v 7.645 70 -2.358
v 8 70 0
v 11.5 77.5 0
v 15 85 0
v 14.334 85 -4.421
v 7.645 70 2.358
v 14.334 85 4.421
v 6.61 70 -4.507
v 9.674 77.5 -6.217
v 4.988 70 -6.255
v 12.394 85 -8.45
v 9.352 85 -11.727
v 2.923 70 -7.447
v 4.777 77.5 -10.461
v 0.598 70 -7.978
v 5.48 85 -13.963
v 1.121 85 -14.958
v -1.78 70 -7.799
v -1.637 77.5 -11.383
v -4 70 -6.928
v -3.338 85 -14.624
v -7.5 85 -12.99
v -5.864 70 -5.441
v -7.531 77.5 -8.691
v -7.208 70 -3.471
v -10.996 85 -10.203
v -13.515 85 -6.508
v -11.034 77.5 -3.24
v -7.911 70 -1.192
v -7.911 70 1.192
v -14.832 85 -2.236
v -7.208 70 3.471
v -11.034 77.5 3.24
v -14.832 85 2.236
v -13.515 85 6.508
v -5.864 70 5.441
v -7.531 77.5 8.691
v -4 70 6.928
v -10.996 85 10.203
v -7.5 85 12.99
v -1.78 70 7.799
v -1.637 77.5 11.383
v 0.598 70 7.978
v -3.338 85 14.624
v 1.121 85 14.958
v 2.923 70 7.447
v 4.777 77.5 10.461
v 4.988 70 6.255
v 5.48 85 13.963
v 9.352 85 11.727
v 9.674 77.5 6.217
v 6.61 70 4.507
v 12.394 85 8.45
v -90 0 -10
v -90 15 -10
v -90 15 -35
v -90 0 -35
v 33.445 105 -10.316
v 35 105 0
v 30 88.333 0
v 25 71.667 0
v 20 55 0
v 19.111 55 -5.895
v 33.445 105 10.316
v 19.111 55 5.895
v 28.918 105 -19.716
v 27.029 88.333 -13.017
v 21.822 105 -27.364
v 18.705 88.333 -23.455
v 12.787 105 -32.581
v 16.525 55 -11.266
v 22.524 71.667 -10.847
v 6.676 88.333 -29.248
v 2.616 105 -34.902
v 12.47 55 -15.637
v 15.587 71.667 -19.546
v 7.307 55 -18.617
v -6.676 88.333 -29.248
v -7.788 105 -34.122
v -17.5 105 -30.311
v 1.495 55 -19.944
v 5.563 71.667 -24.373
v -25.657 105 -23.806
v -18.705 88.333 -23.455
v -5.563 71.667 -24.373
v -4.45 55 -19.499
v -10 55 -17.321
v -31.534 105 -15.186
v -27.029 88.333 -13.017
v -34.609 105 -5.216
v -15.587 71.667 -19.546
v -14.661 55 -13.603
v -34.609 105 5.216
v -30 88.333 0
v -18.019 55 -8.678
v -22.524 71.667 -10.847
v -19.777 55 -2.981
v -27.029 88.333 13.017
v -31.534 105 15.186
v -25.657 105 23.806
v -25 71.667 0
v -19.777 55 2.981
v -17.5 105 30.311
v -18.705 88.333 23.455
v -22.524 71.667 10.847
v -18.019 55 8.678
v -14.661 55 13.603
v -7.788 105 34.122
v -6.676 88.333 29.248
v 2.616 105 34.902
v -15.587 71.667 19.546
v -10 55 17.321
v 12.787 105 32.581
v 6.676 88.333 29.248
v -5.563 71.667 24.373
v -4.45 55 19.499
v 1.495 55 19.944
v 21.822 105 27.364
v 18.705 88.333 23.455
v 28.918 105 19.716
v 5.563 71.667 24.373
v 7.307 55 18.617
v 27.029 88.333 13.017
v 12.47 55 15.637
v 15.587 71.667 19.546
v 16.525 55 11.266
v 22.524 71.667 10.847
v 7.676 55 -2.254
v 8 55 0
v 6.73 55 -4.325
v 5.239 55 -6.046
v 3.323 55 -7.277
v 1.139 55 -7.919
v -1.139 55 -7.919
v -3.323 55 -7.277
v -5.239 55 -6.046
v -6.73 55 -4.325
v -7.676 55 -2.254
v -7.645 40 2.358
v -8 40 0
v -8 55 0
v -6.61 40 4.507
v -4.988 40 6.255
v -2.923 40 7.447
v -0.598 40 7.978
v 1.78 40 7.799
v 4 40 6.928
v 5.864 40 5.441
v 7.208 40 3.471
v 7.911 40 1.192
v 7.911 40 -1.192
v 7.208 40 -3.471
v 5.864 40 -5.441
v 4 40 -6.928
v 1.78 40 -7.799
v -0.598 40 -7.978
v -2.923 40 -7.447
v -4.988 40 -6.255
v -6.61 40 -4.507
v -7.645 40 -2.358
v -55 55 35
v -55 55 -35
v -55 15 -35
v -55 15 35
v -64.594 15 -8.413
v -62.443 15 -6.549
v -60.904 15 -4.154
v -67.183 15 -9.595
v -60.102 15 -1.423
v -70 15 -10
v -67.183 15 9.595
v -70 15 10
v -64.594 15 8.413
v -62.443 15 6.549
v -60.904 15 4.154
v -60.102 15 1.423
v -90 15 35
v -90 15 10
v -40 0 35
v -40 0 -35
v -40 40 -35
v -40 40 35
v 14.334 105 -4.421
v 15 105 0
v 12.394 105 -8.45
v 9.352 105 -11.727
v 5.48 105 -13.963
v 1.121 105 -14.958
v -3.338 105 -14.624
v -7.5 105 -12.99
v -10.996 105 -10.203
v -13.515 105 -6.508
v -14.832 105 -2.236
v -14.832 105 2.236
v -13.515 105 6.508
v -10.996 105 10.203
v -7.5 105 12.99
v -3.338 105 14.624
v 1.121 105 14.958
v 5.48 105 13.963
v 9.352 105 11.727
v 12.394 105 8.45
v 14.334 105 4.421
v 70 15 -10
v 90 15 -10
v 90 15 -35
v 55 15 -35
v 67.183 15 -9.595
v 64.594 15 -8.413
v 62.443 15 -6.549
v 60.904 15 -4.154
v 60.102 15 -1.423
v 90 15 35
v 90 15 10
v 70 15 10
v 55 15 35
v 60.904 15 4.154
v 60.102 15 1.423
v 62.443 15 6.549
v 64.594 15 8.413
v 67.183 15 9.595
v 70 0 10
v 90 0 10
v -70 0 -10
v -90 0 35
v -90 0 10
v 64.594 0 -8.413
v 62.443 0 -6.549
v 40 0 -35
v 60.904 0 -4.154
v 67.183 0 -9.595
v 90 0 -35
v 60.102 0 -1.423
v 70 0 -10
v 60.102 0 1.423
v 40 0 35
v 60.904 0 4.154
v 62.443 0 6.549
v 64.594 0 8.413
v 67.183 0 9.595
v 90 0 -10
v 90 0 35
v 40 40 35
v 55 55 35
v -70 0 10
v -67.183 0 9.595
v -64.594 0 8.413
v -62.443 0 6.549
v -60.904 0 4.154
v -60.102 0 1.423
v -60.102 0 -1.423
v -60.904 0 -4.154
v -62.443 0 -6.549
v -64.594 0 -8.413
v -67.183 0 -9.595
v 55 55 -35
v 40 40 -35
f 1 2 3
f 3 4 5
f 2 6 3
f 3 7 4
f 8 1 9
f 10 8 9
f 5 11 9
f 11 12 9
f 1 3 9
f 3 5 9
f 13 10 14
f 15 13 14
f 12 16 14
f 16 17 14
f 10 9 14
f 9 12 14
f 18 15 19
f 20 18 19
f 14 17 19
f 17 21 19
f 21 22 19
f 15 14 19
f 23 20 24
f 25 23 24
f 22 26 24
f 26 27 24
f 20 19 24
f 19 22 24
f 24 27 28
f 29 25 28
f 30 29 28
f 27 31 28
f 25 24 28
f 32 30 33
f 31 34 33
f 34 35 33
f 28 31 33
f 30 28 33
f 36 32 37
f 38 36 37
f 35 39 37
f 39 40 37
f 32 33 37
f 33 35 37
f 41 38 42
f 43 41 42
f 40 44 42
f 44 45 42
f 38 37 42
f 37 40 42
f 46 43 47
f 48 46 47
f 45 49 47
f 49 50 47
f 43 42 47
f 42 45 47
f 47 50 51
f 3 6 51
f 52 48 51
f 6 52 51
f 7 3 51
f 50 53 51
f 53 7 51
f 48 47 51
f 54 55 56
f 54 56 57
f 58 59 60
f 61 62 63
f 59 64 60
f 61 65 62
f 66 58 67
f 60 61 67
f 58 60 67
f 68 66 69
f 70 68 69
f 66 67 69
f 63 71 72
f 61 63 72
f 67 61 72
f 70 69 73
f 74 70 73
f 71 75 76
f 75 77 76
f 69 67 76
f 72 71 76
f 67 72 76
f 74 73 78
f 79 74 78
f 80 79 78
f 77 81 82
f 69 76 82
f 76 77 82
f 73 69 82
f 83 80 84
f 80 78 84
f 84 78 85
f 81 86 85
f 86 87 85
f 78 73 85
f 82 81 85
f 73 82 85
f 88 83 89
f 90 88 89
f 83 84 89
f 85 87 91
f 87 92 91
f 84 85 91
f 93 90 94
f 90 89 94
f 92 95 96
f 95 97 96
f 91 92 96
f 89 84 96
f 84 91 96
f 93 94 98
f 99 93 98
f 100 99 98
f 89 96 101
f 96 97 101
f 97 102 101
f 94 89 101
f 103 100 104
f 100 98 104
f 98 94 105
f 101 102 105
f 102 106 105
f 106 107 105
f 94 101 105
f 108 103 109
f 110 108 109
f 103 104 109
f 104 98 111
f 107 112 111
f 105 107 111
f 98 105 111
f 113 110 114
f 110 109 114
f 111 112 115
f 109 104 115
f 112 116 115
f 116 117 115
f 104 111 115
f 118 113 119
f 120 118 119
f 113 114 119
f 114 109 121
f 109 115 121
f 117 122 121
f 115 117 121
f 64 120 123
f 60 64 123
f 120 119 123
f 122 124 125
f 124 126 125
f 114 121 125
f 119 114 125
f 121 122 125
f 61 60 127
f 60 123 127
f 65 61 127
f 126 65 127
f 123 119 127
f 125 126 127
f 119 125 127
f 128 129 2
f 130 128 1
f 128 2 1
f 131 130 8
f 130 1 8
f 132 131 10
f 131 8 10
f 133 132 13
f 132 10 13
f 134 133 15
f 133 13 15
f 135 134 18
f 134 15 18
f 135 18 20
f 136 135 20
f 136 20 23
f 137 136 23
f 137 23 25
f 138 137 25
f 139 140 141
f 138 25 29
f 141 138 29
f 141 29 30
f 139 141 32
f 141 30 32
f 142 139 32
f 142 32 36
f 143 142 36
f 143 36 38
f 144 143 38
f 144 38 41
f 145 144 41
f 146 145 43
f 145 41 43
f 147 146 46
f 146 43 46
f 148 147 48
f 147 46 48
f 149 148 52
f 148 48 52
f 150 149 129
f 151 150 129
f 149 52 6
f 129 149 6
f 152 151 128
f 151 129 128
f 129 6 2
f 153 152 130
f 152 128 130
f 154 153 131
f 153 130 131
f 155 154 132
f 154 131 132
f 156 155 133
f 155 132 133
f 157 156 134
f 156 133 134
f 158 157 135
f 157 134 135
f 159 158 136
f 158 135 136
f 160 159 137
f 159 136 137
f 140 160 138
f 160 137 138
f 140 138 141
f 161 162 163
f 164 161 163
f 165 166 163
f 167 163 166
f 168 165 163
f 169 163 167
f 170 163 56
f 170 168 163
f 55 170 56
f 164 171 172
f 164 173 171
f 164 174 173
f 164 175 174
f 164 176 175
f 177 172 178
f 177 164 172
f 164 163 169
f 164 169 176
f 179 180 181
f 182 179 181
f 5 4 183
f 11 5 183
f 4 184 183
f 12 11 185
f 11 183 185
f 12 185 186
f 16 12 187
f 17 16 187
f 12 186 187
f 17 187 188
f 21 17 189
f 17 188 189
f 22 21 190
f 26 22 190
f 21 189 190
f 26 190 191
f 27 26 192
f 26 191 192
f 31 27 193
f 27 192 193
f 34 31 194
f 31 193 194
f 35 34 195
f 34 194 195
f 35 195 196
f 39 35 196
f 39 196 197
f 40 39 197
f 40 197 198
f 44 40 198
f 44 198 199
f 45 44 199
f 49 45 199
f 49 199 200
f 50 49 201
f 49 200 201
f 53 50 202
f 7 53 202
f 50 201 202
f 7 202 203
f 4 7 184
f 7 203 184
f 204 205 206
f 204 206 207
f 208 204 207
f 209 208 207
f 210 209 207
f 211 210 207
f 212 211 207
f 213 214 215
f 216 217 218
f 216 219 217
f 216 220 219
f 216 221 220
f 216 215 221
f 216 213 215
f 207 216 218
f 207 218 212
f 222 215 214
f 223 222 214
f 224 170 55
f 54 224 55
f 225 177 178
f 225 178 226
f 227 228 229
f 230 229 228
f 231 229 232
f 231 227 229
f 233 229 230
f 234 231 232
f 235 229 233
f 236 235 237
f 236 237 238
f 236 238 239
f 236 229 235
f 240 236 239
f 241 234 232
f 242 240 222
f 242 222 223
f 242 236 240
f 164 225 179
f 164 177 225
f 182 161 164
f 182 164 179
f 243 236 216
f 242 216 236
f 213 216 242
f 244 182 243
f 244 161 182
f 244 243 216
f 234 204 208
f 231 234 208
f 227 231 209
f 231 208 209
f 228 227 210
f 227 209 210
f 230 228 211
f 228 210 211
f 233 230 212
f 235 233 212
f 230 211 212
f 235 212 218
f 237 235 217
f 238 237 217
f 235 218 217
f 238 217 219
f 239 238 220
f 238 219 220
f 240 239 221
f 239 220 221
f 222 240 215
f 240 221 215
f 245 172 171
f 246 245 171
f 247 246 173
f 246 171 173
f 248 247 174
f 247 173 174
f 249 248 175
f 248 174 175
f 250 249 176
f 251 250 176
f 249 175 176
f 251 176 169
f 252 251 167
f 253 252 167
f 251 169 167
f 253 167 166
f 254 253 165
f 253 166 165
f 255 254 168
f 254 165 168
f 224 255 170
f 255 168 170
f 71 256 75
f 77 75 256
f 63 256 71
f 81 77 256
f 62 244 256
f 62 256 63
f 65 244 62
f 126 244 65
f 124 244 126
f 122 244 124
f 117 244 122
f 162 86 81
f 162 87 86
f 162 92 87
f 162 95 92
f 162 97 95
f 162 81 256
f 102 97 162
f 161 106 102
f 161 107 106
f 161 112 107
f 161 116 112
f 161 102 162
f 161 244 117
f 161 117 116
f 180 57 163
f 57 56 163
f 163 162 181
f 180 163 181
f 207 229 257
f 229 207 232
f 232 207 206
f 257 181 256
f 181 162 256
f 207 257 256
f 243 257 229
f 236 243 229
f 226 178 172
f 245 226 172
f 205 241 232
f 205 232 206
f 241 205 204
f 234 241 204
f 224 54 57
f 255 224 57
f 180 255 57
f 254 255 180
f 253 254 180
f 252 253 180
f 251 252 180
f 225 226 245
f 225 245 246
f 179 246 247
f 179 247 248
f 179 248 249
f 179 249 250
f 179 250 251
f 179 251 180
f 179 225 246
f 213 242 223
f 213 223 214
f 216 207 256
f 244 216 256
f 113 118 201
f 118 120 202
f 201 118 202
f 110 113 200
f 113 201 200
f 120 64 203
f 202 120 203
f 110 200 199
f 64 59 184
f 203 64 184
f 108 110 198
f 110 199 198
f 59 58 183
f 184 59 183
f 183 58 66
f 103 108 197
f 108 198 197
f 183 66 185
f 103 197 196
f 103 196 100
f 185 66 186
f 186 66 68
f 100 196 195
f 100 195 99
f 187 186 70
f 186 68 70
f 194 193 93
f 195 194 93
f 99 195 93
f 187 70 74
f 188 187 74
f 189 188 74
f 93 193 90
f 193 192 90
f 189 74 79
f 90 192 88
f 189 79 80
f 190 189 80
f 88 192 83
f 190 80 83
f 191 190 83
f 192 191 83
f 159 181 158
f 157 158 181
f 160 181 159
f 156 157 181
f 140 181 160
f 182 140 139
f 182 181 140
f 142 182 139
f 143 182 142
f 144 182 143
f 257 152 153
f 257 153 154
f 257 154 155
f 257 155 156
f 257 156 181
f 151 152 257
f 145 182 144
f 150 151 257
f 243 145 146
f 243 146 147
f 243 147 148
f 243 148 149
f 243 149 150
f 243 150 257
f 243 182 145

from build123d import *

# Parameters (mm, degrees)
BOSS_EXTRUDE1_DEPTH = 35
SKETCH4_R           = 8
CUT_EXTRUDE1_DEPTH  = 112.130553854


with BuildPart() as part:
    # Sketch2 → Boss-Extrude1 (new, symmetric)
    with BuildSketch(Plane.XY):
        Polygon((-90, 0), (-40, 0), (-40, 40), (40, 40), (40, 0), (90, 0), (90, 15), (55, 15), (55, 55), (-55, 55), (-55, 15), (-90, 15), align=None)
    extrude(amount=BOSS_EXTRUDE1_DEPTH, both=True)

    # Sketch4 → Cut-Extrude1 (cut, through all)
    with BuildSketch(Plane(origin=(0, 55, 0), x_dir=(1, 0, 0), z_dir=(0, 1, 0))):
        with Locations(Location((0, 0, 0), (0, 0, 180))):
            Circle(SKETCH4_R)
        with BuildLine():
            Line((-70, 10), (-90, 10))
            Line((-90, 10), (-90, -10))
            Line((-90, -10), (-70, -10))
            ThreePointArc((-70, -10), (-60, 0), (-70, 10))
        make_face()
        with BuildLine():
            Line((90, -10), (90, 10))
            Line((90, 10), (70, 10))
            ThreePointArc((70, 10), (60, 0), (70, -10))
            Line((70, -10), (90, -10))
        make_face()
    extrude(amount=-CUT_EXTRUDE1_DEPTH, mode=Mode.SUBTRACT)

    # Sketch5 → Revolve1 (revolve)
    with BuildSketch(Plane.XY, mode=Mode.PRIVATE) as revolve1_sk:
        Polygon((-35, 105), (-20, 55), (-8, 55), (-8, 70), (-15, 85), (-15, 105), align=None)
    revolve(revolve1_sk.sketch.rotate(Axis((0, 55, 0), (0, 1, 0)), 180), axis=Axis((0, 55, 0), (0, 1, 0)))


solid = part.part
